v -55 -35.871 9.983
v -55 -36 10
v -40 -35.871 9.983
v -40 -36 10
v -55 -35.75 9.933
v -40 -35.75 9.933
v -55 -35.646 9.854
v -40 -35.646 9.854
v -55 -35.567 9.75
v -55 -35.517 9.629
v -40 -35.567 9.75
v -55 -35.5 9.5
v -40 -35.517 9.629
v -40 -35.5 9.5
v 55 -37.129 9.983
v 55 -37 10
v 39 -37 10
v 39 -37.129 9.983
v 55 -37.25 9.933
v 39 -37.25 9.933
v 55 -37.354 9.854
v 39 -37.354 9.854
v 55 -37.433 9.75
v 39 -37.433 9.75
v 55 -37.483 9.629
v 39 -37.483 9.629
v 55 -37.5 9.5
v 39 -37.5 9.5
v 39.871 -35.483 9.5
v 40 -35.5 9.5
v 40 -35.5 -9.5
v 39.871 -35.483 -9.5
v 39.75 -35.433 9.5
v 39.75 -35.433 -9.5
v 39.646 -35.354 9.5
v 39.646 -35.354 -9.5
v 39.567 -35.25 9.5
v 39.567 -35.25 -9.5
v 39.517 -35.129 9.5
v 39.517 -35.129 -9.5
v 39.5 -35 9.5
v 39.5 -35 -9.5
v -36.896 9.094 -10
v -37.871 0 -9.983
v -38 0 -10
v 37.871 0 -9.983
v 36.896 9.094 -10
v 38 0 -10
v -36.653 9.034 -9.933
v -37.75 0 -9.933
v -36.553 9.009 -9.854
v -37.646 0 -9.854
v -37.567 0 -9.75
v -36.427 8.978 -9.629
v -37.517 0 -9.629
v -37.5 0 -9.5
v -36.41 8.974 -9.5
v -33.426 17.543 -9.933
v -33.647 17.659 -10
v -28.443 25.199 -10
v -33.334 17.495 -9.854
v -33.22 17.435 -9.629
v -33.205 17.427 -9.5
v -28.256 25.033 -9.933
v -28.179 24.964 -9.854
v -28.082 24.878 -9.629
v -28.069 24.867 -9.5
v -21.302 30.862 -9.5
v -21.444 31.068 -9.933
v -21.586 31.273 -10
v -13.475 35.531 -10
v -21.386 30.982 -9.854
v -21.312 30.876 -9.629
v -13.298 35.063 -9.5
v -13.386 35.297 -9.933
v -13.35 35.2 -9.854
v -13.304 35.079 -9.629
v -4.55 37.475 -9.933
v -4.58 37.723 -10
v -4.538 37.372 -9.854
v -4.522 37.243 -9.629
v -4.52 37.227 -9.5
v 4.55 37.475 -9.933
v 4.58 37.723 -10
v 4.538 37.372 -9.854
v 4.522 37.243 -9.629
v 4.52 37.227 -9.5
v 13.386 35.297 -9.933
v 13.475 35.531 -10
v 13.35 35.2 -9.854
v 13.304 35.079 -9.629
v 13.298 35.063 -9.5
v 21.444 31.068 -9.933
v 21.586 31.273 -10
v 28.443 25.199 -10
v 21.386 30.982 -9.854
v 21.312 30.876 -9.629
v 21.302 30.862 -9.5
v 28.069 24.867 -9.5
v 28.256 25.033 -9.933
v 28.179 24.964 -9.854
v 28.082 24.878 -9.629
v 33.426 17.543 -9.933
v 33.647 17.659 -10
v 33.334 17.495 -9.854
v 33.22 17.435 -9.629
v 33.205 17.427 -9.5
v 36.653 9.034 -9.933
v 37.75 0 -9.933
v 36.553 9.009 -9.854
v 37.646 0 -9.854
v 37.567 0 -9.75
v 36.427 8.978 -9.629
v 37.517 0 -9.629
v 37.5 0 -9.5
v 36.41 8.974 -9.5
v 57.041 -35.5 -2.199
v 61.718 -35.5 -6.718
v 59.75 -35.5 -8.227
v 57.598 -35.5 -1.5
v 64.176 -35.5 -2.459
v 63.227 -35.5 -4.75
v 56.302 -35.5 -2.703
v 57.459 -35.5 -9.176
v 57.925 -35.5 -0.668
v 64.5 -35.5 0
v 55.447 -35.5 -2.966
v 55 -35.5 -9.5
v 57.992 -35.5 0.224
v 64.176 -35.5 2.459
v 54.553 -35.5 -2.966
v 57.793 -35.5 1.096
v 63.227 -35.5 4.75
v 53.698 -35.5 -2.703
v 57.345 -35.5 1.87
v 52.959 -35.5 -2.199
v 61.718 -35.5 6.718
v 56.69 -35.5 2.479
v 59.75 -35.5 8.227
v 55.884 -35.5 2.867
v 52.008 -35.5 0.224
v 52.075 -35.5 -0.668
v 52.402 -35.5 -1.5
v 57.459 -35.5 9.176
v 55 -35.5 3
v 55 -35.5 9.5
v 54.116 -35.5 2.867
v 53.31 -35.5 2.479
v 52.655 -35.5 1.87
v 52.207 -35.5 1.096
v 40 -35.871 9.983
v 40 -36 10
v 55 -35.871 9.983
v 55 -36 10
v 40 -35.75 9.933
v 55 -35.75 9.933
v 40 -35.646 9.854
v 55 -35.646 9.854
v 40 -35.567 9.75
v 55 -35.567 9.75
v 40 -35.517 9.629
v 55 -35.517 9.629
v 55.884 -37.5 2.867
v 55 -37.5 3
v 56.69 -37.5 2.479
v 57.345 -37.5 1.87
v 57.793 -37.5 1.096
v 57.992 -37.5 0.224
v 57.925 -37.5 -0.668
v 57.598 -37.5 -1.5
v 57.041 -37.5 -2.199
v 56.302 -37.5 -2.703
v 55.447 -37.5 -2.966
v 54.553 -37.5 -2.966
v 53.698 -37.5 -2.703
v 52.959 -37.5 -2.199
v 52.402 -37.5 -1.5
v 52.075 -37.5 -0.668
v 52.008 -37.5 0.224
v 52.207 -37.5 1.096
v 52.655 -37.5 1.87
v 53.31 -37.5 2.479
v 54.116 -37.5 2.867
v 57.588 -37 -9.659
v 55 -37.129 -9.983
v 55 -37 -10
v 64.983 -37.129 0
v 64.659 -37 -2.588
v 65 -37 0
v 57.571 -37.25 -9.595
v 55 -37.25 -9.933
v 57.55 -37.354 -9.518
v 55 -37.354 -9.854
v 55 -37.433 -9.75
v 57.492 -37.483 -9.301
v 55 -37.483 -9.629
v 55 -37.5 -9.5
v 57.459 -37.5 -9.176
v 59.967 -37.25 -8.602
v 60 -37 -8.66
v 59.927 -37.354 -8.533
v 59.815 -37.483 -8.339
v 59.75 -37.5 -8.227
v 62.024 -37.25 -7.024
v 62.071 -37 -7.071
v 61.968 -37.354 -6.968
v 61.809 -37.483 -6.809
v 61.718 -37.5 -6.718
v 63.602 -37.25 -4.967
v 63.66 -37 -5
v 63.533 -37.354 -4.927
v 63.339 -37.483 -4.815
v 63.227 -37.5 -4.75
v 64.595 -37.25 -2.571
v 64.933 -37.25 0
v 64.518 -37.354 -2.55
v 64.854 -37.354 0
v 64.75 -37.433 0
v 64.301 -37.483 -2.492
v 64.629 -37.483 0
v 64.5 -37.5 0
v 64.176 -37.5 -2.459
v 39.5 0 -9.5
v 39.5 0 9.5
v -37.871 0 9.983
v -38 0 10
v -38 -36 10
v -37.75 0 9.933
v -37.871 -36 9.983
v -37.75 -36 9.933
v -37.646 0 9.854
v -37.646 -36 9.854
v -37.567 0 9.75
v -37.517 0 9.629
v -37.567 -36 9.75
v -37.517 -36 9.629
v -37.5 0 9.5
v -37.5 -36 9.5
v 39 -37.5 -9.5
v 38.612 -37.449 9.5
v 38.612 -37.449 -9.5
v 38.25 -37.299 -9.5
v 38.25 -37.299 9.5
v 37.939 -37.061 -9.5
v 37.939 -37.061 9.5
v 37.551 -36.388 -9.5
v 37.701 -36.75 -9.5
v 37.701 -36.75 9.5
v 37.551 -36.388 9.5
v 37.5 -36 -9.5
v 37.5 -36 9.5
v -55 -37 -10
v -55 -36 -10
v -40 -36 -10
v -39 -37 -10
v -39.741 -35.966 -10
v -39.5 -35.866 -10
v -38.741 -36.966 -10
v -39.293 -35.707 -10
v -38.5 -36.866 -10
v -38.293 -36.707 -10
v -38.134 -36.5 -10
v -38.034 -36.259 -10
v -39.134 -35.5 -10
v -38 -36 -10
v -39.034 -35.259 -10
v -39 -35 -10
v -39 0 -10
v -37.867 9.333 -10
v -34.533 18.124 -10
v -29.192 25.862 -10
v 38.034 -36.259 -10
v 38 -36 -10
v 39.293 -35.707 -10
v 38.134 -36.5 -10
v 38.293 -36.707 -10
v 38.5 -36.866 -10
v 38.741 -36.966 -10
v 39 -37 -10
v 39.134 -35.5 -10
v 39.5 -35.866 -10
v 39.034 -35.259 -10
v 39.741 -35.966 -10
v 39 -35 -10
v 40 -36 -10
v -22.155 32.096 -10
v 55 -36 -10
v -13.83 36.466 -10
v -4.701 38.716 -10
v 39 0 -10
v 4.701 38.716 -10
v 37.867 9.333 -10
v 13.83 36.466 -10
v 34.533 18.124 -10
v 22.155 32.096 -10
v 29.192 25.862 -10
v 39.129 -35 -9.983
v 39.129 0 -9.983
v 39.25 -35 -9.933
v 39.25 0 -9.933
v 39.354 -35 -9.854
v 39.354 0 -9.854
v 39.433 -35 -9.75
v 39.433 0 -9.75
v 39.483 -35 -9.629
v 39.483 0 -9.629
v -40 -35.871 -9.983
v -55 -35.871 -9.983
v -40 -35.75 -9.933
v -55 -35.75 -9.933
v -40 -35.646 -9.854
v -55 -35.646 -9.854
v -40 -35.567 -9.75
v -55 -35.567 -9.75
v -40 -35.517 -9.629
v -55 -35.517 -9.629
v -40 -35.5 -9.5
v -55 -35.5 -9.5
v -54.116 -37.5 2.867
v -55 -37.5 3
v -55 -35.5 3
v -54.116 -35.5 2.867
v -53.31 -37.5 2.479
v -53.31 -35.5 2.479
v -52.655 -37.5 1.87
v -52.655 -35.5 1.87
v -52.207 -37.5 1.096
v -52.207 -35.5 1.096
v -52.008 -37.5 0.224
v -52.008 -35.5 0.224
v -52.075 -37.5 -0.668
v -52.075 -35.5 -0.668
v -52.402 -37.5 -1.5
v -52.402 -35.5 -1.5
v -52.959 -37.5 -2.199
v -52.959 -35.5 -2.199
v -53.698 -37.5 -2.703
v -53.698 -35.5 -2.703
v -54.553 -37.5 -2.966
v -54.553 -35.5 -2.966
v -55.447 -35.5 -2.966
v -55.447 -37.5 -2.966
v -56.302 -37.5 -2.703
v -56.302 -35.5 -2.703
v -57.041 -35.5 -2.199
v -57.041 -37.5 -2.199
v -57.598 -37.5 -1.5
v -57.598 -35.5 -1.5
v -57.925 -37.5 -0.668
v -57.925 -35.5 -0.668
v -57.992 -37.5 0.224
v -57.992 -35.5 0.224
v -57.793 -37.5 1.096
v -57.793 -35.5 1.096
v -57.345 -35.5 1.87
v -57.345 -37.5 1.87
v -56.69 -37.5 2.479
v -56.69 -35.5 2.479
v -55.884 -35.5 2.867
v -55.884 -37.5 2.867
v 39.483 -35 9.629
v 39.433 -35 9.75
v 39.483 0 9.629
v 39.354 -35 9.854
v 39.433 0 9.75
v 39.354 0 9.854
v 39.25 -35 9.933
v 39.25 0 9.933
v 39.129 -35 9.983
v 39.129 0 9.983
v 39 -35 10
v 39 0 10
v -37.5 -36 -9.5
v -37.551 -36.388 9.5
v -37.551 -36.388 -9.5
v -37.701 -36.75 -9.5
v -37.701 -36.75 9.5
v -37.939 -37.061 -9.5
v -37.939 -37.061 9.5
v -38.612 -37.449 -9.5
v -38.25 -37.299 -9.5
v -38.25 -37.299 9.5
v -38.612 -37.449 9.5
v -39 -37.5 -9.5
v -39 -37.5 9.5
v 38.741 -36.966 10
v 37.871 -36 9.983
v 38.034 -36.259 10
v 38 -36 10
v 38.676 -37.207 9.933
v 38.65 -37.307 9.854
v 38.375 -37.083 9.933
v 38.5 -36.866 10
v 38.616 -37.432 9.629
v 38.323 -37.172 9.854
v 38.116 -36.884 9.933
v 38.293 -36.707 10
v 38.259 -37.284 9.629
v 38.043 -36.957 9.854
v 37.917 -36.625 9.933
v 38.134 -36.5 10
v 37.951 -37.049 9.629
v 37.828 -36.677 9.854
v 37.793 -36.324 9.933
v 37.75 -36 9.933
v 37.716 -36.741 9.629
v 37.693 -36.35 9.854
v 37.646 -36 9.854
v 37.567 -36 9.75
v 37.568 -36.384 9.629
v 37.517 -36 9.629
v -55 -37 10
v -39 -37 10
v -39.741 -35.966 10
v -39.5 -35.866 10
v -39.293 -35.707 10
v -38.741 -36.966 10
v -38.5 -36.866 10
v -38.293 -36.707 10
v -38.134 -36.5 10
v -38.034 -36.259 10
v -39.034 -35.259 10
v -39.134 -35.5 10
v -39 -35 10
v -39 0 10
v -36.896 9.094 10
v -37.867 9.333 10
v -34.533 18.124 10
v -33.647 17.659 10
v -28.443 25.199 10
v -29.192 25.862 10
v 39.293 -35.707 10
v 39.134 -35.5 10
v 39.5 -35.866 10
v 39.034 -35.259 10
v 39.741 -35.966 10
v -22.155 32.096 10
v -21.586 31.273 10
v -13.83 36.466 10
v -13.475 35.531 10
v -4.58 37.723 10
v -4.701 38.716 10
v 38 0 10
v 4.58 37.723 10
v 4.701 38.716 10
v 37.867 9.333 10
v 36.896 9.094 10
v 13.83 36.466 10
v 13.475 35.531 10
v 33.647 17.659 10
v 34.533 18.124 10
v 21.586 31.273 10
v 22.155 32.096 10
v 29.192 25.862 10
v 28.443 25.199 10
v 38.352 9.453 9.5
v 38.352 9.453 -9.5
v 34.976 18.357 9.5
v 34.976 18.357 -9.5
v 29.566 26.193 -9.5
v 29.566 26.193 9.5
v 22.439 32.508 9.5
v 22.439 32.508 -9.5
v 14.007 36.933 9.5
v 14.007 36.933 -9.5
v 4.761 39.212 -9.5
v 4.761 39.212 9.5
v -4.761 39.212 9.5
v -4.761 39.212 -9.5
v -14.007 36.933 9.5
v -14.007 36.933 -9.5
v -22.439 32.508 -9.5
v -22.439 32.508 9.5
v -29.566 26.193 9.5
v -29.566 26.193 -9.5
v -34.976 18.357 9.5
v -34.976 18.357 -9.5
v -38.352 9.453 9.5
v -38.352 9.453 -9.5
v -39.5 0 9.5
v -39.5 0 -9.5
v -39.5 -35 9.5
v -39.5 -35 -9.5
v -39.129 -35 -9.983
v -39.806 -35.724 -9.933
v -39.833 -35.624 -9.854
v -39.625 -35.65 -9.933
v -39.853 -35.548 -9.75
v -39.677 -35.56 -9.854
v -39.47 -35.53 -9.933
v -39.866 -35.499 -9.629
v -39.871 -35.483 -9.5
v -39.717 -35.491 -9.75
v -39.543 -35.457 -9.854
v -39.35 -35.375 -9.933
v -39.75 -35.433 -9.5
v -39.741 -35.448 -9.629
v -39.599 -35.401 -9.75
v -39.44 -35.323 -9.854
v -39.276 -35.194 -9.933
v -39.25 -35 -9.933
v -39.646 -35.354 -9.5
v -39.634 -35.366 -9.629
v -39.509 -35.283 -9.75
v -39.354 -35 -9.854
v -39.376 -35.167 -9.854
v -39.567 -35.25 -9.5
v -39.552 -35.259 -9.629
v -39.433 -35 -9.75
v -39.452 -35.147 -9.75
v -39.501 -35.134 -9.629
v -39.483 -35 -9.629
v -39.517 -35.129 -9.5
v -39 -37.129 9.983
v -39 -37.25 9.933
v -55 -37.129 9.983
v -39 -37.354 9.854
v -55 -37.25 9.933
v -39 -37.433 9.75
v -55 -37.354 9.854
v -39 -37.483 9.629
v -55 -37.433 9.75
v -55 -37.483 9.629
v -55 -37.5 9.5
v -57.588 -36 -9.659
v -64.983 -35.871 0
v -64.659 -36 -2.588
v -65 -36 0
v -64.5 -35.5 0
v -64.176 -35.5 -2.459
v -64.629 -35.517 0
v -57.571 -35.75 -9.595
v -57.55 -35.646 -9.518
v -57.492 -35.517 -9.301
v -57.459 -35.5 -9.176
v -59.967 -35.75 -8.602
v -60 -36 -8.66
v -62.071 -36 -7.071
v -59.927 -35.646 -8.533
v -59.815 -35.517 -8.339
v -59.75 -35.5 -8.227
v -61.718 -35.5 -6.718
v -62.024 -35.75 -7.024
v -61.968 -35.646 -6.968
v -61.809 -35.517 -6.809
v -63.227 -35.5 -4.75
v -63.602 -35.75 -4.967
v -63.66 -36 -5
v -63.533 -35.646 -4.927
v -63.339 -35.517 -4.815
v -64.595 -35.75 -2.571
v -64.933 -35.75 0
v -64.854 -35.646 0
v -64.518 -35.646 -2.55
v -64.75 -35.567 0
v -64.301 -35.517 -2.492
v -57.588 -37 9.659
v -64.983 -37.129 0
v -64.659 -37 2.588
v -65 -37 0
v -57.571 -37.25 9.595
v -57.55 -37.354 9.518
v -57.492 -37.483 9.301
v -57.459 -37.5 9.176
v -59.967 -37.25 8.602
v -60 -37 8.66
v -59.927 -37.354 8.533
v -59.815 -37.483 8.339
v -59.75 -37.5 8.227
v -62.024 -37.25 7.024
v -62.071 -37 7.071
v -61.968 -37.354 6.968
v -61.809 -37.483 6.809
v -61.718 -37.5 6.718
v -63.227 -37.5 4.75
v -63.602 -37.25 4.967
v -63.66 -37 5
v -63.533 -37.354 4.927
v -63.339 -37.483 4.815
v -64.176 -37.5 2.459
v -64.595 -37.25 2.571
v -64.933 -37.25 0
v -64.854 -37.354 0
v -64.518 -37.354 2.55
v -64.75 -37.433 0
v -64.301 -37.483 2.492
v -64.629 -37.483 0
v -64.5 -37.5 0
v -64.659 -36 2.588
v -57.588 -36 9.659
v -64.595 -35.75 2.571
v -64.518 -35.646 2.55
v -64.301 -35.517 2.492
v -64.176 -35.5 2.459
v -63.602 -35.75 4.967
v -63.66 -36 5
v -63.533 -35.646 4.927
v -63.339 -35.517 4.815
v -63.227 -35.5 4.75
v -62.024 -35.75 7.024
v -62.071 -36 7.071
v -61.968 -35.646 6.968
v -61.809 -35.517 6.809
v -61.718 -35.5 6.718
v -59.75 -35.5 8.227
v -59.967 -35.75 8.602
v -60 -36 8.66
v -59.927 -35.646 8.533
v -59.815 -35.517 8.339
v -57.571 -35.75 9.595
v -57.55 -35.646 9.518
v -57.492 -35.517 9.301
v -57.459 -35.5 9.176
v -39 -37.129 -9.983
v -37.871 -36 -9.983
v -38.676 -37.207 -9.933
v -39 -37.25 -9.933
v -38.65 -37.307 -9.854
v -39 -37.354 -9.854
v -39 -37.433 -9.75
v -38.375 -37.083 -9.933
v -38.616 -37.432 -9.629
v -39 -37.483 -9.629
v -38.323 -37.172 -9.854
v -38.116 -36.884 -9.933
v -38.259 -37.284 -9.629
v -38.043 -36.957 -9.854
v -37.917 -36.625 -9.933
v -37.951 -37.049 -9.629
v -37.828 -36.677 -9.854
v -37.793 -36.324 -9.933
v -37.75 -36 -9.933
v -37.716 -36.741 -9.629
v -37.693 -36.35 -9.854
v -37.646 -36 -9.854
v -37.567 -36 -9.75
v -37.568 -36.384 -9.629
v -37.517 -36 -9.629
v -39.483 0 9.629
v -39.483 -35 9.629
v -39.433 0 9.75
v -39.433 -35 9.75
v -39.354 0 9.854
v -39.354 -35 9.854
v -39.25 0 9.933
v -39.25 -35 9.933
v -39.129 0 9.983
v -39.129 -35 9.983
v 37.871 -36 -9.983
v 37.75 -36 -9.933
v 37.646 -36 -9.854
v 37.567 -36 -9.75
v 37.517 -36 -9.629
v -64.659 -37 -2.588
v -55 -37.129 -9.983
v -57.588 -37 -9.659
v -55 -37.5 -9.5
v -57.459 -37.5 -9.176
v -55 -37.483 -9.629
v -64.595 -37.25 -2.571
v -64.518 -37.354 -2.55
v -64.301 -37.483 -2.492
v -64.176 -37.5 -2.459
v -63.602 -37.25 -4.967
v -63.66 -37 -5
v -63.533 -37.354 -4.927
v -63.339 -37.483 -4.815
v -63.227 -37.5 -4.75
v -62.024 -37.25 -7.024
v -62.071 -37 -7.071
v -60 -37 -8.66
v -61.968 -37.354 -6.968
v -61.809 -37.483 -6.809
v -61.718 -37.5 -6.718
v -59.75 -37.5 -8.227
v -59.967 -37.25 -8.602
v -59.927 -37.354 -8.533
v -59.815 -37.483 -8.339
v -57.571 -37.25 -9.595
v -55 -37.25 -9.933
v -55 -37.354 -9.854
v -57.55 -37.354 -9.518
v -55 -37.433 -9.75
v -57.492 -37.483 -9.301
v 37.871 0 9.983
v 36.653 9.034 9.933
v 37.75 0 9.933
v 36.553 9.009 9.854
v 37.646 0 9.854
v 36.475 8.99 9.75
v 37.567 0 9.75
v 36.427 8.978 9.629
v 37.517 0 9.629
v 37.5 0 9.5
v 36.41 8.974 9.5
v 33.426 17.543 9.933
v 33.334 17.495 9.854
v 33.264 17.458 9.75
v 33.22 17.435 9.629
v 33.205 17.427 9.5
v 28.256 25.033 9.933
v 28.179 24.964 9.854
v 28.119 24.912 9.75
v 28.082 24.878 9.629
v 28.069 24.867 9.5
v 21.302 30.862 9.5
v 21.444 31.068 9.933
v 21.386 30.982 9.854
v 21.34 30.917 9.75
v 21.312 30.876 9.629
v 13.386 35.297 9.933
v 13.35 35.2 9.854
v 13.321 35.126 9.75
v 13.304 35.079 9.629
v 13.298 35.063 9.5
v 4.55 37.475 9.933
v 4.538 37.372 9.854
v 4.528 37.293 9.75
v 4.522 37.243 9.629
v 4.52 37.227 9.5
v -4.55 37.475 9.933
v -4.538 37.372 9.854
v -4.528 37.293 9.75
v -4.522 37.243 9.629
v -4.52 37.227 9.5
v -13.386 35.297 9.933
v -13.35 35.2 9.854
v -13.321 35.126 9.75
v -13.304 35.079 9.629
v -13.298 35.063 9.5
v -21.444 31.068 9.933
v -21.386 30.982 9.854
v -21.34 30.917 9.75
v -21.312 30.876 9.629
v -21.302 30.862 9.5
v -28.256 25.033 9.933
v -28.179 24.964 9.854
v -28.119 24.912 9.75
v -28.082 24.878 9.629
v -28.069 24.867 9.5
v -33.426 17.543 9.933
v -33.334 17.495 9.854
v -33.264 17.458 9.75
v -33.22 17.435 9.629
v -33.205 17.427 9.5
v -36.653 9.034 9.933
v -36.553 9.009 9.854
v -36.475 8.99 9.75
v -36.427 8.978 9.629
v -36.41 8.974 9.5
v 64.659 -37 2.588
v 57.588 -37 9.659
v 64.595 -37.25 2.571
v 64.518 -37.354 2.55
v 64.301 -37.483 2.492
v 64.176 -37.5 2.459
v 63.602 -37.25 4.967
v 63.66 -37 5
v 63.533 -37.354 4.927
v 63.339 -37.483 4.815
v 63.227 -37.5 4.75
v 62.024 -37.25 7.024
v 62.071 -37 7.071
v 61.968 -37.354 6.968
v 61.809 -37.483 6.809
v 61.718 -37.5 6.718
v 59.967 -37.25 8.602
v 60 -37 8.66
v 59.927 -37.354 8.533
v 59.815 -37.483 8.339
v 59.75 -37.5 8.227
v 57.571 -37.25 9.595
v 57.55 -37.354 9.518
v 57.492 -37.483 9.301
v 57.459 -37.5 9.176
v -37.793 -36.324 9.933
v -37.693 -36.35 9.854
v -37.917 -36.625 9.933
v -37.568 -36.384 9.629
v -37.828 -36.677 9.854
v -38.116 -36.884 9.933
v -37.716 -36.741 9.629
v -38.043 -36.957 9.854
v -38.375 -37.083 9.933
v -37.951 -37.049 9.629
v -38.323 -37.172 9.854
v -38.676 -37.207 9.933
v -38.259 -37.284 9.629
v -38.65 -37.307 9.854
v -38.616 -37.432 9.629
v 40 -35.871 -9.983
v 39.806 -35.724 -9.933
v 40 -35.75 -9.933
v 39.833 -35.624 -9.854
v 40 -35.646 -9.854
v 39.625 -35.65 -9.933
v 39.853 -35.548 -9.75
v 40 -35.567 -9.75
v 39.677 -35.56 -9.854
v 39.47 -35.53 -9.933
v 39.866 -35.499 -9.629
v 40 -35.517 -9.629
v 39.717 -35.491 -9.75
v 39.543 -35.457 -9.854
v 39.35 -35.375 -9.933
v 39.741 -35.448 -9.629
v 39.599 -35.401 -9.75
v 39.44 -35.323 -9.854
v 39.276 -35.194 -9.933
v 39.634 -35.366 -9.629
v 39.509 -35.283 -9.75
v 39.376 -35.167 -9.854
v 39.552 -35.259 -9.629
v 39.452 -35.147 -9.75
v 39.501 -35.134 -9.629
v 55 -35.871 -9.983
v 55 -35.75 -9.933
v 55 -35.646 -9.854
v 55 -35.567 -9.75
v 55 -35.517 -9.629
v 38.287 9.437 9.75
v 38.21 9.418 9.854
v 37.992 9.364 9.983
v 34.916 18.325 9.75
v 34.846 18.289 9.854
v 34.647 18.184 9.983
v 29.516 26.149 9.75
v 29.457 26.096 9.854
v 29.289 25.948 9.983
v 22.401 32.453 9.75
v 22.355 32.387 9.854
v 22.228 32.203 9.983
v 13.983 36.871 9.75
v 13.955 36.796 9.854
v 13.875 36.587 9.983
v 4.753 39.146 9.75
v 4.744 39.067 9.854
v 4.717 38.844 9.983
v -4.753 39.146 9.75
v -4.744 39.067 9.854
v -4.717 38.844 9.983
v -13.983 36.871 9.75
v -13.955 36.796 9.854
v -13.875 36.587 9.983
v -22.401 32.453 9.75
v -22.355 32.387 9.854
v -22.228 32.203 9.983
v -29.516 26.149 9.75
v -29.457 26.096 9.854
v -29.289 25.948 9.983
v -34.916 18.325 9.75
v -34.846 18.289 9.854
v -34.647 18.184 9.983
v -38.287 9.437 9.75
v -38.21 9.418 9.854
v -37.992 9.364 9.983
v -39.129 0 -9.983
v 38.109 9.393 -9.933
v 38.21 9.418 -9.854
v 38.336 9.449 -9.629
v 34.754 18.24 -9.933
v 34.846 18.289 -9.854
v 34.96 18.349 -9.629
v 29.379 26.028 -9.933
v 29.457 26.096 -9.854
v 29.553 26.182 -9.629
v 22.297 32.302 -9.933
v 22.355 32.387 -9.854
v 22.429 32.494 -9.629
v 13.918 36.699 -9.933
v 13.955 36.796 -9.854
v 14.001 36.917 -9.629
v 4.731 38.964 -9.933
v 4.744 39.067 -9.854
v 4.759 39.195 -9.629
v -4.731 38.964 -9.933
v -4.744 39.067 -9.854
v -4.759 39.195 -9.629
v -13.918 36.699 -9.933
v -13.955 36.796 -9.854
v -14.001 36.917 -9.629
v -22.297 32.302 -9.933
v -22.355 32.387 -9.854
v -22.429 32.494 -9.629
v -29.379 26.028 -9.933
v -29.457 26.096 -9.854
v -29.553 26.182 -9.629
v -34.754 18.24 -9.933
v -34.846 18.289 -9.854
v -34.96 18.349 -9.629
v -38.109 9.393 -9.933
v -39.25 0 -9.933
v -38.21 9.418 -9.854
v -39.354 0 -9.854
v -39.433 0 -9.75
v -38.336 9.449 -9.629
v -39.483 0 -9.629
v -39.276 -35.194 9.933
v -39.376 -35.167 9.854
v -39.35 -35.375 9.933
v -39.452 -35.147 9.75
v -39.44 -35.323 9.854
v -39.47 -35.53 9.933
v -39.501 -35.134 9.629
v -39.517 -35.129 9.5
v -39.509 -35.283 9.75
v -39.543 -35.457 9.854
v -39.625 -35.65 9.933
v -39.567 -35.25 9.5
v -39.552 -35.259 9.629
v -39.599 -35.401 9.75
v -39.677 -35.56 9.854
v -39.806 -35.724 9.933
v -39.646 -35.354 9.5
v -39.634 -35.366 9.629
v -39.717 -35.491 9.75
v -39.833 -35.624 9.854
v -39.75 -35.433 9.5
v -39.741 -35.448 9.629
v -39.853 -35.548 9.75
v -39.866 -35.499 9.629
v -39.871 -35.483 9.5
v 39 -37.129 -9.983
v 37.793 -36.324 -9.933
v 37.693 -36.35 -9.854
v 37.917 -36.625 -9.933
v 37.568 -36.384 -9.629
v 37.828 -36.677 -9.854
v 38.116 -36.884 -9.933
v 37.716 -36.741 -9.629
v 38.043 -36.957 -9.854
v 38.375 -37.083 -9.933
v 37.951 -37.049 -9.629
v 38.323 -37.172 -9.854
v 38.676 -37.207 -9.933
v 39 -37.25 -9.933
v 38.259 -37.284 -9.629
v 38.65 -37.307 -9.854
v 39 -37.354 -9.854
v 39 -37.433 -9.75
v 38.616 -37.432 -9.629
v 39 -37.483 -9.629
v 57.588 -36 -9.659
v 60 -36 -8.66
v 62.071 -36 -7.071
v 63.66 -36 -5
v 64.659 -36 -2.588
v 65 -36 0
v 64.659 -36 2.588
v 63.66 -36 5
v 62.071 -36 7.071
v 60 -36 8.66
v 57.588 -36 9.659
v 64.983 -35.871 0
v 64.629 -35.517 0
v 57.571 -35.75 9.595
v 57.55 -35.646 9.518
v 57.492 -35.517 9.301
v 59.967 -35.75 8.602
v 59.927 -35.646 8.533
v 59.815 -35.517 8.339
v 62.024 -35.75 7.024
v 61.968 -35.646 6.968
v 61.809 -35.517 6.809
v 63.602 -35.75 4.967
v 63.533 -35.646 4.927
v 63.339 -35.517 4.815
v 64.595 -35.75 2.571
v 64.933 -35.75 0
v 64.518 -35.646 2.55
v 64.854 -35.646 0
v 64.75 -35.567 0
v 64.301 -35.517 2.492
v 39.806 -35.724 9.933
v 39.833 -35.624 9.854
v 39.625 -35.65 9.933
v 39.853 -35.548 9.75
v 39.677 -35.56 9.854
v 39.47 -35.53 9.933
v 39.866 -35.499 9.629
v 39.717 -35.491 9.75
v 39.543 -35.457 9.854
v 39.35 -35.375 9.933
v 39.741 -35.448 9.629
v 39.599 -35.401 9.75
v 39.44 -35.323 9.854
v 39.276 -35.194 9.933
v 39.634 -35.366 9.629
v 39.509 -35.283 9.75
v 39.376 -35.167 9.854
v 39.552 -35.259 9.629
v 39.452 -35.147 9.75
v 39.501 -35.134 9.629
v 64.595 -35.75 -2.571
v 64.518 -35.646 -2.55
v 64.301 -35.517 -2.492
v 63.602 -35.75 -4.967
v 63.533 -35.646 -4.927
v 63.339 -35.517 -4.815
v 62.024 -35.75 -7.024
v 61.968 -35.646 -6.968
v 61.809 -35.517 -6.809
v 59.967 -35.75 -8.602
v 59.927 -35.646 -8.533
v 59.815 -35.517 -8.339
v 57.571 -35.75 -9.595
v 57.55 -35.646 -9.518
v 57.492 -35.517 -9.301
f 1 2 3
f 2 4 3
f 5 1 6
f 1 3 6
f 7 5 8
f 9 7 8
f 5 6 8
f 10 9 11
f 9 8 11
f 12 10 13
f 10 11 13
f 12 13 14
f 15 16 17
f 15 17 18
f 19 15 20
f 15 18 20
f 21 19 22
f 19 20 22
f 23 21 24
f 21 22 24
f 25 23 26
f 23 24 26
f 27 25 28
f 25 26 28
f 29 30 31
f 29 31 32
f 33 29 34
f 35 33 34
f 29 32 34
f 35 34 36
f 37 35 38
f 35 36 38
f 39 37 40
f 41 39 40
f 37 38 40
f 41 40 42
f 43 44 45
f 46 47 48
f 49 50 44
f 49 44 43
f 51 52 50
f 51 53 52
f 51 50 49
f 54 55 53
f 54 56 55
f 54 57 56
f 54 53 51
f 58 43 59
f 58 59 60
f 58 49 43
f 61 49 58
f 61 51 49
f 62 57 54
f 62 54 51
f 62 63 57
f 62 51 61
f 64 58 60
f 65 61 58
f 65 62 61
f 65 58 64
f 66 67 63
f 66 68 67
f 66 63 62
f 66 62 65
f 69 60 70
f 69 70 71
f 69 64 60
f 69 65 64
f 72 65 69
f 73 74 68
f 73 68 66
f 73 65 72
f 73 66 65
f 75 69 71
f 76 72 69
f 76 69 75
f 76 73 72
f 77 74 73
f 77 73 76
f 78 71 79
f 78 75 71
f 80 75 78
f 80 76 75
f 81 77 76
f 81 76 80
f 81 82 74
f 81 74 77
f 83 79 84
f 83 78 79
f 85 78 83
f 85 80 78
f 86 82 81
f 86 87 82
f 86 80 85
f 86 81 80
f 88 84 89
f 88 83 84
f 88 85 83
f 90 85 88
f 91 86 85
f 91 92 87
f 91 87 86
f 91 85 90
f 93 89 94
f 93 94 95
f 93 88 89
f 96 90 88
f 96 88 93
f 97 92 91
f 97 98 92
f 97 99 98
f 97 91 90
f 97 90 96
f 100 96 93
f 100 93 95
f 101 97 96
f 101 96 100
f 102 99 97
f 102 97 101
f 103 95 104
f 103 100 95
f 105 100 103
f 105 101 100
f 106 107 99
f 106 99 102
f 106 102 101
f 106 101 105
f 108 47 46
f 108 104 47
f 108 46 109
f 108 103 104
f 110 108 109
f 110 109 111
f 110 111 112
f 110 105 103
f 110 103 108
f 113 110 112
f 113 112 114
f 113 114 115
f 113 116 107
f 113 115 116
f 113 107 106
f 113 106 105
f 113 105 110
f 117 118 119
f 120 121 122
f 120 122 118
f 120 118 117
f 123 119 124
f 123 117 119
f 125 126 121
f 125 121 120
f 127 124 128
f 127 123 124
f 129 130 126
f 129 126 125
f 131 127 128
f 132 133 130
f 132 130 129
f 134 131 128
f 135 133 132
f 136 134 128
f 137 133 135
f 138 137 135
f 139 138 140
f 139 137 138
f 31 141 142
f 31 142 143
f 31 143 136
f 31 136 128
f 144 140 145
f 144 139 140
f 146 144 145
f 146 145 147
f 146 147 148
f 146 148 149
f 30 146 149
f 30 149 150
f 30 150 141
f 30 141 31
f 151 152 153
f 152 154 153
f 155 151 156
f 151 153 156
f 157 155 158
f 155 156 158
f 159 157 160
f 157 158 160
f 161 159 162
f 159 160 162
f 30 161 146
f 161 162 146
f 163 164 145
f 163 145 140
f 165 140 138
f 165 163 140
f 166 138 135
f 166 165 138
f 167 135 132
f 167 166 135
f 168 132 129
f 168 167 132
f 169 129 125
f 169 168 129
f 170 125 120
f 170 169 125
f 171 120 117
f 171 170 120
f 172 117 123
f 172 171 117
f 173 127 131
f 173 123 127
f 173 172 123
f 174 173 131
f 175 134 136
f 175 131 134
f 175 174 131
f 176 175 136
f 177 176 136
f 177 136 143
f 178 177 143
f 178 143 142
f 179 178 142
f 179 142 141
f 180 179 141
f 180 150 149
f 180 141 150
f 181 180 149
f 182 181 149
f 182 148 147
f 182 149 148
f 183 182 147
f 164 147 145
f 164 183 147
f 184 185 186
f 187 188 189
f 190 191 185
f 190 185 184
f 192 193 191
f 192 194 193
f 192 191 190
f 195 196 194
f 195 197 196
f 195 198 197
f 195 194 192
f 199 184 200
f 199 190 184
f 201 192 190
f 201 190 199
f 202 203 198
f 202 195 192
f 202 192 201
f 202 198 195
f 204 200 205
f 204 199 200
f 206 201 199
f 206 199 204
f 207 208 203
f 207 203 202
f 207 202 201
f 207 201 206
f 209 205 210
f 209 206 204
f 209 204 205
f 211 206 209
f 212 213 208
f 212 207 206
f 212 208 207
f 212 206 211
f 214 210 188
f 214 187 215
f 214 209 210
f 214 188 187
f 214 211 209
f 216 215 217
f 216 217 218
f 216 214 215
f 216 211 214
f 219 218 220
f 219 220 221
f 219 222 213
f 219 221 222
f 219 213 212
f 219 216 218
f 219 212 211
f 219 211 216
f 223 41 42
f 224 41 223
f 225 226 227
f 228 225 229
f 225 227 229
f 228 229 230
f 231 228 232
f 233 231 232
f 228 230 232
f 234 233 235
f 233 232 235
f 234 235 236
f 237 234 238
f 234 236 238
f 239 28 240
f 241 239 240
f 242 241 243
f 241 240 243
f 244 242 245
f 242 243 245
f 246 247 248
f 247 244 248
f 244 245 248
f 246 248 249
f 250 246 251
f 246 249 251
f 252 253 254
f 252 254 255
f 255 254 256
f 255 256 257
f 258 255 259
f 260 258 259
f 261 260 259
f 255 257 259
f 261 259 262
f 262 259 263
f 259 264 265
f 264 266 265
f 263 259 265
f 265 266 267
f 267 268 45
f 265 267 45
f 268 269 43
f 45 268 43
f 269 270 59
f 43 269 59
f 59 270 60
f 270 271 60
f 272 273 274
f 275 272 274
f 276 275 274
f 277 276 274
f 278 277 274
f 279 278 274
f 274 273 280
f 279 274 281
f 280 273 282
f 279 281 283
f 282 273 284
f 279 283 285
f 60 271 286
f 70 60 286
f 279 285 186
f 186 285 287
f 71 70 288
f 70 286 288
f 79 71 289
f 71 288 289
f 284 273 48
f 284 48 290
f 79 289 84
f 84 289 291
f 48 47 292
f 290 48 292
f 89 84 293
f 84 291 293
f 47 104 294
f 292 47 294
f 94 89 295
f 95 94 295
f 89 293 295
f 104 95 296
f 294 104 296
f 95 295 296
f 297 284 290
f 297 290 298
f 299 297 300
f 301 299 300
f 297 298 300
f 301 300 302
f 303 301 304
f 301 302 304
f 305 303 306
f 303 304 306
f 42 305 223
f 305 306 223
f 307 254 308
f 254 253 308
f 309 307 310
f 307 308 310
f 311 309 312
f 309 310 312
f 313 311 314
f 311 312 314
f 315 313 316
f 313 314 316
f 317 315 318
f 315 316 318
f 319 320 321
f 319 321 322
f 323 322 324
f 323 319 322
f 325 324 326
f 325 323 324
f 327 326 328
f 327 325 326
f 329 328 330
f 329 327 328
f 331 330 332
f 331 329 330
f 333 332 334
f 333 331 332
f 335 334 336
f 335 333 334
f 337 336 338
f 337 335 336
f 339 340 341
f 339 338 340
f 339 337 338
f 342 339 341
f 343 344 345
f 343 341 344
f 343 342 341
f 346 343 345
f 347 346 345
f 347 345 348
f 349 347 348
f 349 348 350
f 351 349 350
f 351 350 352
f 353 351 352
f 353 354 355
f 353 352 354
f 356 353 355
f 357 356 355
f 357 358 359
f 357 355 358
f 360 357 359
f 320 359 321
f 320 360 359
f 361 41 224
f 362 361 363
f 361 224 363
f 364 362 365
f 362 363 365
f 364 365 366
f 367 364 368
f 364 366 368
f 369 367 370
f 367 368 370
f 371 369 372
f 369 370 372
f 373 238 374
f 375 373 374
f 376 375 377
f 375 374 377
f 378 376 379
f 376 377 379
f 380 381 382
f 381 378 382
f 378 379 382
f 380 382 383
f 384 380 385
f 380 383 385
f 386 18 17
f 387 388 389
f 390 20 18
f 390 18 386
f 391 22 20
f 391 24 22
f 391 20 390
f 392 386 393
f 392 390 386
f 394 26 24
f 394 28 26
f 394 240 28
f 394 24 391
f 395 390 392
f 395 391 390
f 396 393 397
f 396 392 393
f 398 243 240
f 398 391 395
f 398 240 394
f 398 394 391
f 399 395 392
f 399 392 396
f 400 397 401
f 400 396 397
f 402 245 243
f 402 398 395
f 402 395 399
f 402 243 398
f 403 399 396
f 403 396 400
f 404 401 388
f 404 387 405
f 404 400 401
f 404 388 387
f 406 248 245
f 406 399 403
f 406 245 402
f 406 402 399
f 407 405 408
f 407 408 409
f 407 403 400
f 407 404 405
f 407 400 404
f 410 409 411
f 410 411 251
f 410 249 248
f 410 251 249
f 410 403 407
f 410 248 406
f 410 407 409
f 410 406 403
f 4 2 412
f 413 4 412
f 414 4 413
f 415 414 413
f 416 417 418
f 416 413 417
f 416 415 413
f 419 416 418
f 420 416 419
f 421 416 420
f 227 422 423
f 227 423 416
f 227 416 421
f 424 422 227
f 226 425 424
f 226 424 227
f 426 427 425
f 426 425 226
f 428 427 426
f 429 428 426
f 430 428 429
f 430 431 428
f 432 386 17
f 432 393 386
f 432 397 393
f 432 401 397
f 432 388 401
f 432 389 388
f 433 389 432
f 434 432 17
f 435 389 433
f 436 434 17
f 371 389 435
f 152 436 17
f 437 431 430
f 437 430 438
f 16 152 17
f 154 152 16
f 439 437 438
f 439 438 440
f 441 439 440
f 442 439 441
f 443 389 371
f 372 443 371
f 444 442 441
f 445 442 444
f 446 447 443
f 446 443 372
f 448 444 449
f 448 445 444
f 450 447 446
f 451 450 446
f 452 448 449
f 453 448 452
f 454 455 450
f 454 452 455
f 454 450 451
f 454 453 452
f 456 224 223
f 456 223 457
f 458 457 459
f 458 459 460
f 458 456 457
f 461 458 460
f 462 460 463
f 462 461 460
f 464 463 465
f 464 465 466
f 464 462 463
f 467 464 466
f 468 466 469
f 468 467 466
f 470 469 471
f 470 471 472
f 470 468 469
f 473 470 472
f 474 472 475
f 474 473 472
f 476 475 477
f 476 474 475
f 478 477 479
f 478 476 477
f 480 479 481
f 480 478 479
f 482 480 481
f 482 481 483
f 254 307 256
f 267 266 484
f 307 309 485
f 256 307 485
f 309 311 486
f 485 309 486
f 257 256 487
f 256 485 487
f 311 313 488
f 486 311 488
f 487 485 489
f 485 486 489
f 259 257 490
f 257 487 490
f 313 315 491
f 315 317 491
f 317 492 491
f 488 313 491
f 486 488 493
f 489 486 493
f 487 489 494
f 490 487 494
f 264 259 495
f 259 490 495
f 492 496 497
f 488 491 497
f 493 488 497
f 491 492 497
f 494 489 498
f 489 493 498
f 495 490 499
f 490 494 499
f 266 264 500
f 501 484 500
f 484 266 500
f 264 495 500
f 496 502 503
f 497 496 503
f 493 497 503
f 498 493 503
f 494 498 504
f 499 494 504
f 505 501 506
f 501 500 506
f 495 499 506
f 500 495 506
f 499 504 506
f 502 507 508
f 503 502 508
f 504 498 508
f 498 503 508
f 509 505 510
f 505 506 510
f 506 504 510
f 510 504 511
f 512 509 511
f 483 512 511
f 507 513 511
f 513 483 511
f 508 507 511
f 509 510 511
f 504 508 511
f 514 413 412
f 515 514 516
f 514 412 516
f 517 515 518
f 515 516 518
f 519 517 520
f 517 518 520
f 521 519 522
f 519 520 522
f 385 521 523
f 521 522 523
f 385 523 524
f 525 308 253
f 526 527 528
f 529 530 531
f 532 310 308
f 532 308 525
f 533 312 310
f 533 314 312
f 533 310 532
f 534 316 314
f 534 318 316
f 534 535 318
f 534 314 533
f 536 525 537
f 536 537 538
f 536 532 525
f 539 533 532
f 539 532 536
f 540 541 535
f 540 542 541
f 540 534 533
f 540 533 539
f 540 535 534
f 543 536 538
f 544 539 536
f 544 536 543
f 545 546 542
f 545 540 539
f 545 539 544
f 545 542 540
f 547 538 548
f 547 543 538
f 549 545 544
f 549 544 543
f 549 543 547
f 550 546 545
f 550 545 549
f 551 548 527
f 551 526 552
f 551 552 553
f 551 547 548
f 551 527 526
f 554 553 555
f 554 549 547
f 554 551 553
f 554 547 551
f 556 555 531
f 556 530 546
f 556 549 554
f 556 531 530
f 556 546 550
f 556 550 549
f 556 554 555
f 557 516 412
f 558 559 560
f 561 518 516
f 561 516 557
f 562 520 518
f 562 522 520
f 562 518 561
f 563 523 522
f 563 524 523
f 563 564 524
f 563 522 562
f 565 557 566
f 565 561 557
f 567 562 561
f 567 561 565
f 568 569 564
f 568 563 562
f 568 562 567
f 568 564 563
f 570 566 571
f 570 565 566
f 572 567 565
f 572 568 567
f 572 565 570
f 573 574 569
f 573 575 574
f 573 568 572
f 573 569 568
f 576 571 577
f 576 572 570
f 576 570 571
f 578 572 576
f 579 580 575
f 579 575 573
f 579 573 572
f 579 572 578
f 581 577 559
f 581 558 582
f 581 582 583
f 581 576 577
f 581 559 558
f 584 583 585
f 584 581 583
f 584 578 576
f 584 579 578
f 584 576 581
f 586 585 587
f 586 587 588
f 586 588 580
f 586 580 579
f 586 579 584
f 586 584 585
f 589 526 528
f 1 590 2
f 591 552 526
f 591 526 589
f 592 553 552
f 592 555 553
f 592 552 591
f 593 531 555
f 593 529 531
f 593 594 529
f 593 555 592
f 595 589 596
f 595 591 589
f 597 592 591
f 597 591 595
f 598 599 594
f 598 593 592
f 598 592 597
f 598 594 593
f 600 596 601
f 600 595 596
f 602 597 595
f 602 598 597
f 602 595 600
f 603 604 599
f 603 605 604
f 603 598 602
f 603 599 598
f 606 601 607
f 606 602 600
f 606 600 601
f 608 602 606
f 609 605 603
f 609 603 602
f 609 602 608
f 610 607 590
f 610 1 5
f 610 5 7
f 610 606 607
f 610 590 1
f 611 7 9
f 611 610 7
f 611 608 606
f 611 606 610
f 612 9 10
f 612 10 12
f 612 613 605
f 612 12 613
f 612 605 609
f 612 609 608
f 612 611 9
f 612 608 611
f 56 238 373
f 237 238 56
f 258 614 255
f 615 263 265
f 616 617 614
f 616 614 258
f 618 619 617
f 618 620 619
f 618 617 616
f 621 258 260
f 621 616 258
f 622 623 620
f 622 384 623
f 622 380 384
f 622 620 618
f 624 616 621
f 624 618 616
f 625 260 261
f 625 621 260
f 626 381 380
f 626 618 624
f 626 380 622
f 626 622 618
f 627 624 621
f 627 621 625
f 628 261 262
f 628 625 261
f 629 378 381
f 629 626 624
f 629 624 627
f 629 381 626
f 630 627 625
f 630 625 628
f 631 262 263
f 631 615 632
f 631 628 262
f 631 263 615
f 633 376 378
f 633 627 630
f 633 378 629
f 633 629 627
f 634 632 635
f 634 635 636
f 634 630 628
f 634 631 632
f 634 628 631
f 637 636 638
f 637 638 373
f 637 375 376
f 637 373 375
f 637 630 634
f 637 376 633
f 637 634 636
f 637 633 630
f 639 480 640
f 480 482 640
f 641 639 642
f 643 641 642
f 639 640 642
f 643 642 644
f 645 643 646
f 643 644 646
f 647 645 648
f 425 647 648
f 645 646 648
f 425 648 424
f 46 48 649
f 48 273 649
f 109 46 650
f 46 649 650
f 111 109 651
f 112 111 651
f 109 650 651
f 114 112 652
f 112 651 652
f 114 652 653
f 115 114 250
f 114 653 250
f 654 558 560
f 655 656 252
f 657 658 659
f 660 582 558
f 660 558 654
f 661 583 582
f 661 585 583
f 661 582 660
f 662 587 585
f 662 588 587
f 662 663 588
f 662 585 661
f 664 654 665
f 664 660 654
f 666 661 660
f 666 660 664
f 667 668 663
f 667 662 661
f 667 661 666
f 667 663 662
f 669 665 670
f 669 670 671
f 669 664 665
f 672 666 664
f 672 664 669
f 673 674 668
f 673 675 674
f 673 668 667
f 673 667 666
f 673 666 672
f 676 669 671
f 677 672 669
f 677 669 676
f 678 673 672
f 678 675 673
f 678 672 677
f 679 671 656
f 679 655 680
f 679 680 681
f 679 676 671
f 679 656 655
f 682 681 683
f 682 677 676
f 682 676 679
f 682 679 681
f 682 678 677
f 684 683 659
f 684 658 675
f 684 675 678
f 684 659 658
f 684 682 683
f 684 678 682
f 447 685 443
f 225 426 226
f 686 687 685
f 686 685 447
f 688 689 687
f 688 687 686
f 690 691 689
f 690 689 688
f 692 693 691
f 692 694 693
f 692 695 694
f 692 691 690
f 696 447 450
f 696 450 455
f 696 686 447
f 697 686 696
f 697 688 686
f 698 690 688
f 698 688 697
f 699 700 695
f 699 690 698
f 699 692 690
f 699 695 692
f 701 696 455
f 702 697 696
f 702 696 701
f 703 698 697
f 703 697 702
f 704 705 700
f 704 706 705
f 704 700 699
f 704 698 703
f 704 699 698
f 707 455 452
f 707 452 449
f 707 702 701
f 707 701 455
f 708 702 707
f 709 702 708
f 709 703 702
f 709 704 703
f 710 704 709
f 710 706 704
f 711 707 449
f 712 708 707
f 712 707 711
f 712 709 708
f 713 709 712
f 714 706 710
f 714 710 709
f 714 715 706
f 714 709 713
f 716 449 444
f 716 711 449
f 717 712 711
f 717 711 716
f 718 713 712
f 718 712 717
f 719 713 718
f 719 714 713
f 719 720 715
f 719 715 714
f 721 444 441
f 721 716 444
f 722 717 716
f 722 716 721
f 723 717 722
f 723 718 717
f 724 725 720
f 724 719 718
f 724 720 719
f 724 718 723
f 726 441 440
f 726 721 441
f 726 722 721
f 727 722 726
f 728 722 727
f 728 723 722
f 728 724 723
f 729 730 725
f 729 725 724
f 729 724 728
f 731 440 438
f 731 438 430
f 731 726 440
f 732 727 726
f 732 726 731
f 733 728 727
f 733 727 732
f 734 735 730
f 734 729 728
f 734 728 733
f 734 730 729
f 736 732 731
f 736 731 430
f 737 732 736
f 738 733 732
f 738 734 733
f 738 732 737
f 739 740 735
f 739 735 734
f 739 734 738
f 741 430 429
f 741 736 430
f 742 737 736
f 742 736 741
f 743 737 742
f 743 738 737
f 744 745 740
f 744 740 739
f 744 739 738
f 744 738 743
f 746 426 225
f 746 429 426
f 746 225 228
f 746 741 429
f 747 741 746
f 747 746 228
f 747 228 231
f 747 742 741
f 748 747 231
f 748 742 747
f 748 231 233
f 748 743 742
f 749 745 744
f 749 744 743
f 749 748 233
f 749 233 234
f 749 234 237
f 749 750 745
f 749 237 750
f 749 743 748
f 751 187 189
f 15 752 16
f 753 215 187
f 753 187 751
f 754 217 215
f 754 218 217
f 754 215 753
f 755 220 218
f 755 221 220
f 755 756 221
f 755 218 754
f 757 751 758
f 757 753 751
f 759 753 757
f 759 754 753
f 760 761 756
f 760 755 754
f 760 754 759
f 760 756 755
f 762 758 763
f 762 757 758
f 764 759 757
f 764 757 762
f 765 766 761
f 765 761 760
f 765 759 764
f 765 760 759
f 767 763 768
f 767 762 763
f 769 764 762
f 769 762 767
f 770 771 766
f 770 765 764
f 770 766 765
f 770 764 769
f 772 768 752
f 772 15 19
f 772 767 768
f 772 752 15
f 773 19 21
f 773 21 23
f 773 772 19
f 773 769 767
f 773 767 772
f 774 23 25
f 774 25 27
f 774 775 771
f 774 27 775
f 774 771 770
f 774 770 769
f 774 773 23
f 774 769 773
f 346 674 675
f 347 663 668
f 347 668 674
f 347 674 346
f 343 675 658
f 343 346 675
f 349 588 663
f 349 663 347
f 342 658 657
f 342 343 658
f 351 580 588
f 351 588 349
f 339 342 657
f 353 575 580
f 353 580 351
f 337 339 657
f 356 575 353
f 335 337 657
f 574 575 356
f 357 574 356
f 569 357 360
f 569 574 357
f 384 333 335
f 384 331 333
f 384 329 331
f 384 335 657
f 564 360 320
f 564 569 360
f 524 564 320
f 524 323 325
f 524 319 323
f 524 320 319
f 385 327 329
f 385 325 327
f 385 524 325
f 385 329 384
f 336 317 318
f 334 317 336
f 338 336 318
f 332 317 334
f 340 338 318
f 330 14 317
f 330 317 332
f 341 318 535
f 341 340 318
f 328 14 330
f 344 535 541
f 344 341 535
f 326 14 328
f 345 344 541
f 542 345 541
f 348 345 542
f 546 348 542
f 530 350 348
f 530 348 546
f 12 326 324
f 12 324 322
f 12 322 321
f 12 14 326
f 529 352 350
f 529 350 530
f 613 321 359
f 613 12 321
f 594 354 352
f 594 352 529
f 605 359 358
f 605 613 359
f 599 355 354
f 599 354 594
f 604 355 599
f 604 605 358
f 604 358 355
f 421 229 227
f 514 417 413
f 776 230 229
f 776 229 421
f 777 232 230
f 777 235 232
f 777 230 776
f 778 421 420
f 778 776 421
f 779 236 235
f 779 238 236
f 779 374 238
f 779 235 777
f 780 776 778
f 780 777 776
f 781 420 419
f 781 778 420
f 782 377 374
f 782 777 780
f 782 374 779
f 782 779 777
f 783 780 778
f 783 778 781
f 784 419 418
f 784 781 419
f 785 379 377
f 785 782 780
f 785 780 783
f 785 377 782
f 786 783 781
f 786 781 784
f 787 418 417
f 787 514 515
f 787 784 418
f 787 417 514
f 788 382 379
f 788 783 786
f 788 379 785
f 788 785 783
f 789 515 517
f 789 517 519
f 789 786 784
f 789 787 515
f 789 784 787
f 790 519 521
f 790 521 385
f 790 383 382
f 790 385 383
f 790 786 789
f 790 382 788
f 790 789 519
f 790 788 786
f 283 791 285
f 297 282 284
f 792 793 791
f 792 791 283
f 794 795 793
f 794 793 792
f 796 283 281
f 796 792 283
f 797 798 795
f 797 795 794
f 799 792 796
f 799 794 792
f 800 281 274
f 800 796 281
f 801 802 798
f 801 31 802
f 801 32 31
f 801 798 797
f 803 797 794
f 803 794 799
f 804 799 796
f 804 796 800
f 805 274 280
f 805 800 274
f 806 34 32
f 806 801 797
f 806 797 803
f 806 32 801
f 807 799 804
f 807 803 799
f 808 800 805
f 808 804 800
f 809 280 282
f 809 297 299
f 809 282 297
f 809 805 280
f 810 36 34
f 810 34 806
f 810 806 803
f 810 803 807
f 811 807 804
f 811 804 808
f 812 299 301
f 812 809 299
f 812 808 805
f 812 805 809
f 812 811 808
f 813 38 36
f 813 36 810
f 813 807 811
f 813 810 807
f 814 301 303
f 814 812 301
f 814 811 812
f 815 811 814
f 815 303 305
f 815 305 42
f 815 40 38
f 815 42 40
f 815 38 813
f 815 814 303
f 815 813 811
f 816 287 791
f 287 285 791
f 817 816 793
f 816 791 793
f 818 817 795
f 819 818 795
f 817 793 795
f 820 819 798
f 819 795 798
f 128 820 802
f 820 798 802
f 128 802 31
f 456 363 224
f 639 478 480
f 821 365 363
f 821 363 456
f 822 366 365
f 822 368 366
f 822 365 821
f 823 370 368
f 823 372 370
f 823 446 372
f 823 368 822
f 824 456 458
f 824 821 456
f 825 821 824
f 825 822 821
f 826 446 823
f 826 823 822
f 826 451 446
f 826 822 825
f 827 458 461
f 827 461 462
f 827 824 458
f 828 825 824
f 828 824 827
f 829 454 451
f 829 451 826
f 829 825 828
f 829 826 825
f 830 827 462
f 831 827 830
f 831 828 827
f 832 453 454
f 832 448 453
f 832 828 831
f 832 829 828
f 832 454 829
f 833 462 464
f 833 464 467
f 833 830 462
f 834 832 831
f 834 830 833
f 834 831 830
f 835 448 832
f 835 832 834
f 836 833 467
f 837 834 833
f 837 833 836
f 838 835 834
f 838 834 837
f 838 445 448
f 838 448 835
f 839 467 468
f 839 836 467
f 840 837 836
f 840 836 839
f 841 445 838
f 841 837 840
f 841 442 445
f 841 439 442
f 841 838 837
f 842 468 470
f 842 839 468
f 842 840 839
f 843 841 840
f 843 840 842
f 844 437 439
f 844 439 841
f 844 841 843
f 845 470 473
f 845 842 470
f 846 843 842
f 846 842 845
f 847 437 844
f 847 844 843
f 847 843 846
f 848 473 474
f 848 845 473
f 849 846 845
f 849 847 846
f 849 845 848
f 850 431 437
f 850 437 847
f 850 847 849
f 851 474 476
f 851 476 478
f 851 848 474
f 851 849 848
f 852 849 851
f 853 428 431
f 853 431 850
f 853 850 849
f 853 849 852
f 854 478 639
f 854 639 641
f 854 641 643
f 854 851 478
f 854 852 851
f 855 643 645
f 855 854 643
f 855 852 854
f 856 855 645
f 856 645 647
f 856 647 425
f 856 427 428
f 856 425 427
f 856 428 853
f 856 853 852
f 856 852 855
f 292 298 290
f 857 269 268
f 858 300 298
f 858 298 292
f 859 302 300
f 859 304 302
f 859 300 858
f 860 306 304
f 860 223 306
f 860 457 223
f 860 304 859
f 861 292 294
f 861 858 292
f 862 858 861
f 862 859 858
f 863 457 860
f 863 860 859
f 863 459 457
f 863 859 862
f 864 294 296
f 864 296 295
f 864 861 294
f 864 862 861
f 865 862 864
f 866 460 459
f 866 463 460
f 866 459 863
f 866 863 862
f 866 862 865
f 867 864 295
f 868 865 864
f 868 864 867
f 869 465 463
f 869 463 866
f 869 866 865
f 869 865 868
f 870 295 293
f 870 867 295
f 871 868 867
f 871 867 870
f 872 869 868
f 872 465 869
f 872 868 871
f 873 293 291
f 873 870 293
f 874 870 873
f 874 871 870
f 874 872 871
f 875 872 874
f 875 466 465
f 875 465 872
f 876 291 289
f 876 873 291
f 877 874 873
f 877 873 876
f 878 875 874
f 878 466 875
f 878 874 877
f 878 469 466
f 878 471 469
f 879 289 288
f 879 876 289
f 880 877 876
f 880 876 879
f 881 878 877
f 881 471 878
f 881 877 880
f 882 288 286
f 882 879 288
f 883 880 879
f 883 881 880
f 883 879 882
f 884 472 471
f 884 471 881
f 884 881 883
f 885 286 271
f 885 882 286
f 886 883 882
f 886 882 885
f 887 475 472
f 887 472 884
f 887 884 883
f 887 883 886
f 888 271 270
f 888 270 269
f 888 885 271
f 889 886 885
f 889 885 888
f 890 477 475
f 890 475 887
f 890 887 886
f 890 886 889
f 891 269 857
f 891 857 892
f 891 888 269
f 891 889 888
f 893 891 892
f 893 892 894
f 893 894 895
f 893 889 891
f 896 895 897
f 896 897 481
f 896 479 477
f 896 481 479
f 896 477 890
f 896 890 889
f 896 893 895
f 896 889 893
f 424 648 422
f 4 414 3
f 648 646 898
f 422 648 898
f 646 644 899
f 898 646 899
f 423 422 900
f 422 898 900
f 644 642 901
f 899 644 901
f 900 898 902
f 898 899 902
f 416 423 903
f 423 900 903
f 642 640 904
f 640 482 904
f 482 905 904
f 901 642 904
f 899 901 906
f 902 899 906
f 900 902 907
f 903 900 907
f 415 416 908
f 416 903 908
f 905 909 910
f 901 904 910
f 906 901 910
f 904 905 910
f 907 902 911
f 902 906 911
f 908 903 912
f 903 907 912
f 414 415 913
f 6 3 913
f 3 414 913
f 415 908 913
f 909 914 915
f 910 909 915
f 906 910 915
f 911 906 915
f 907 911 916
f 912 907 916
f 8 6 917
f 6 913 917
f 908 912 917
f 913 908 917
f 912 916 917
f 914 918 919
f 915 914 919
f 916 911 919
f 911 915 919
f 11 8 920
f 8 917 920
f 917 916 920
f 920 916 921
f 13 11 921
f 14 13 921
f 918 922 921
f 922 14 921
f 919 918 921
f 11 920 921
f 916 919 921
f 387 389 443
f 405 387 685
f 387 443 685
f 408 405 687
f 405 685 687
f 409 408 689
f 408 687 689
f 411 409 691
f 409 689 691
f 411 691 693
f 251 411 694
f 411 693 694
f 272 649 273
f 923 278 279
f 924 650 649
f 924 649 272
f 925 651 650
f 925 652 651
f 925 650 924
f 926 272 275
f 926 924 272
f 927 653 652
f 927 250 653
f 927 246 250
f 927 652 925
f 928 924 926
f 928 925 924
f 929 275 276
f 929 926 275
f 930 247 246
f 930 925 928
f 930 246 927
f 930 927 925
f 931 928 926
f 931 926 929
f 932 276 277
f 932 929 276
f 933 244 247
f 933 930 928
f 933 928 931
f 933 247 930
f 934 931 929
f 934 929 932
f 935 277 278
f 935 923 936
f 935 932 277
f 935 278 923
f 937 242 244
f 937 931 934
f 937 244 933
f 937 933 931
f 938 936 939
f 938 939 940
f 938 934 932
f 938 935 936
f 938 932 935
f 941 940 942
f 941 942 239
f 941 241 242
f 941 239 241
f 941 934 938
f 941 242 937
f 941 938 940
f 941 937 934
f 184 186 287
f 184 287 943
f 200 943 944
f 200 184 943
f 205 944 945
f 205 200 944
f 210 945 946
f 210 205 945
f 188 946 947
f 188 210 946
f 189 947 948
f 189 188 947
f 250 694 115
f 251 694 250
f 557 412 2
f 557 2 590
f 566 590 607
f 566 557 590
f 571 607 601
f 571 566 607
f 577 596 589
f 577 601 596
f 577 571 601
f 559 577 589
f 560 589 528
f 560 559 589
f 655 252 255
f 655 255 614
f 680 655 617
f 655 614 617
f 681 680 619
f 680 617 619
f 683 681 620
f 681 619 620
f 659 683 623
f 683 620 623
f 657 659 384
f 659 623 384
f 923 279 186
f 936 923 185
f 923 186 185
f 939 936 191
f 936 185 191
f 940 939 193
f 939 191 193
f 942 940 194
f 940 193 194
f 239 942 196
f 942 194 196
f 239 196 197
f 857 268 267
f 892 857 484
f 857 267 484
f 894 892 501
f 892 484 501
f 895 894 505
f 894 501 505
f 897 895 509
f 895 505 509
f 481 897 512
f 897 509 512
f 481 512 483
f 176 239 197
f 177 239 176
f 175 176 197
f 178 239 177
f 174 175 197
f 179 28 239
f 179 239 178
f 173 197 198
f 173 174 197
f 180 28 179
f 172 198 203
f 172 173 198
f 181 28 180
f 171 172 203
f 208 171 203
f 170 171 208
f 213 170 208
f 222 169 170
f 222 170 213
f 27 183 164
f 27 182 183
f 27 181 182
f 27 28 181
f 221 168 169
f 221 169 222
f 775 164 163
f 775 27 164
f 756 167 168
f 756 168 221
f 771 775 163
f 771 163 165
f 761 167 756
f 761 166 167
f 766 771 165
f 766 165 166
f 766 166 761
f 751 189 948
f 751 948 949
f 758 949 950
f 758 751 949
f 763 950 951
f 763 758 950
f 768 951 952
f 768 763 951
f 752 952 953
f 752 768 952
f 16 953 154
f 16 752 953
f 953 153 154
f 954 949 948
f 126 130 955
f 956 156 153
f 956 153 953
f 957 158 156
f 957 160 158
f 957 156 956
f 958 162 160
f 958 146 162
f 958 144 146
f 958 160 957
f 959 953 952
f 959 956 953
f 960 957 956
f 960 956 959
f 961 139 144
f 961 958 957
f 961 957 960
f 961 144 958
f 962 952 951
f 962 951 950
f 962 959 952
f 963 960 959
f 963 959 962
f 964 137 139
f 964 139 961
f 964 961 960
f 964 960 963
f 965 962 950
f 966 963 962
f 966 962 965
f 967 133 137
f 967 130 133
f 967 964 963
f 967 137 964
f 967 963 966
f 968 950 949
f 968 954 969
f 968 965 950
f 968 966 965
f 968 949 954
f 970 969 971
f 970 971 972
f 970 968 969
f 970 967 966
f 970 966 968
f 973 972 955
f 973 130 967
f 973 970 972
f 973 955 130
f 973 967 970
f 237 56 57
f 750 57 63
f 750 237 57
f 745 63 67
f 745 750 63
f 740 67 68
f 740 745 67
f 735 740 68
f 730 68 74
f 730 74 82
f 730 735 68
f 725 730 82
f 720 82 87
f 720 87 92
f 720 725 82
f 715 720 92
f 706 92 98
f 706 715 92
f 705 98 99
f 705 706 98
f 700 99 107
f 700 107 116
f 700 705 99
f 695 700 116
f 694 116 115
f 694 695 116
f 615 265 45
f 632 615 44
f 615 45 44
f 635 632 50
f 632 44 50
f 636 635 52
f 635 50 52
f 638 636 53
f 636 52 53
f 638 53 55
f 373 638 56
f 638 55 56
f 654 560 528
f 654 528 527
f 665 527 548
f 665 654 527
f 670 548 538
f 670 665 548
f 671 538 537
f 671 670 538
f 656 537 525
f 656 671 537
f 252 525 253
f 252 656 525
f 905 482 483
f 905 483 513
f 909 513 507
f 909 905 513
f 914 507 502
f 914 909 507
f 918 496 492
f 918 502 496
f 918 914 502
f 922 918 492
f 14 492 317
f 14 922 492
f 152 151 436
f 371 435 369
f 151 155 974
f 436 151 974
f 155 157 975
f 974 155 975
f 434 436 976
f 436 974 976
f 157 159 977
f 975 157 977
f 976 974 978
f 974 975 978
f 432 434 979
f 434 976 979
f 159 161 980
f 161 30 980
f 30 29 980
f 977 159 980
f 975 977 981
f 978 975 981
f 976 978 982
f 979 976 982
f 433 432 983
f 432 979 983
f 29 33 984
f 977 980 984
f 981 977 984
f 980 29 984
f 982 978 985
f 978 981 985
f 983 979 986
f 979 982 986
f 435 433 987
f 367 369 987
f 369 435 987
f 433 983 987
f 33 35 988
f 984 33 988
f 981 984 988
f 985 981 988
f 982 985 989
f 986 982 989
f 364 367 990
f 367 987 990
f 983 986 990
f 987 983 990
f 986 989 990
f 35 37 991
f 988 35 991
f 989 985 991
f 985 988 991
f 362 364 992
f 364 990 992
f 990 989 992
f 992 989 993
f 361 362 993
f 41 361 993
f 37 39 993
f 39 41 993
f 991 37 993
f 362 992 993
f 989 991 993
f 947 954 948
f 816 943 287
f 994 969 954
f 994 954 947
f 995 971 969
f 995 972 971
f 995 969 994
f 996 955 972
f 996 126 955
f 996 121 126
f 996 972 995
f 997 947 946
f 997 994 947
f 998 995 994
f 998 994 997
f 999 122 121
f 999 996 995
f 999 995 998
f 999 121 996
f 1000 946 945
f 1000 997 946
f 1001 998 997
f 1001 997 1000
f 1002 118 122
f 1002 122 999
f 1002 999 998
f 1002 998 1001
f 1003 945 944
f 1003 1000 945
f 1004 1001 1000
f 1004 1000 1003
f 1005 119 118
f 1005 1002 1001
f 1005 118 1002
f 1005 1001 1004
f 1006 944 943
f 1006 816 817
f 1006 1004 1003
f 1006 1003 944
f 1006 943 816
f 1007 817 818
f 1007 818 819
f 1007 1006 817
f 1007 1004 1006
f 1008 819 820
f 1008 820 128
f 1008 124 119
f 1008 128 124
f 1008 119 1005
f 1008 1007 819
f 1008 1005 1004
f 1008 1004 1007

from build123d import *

# Parameters (mm, degrees)
BOSS_EXTRUDE1_DEPTH     = 10
CUT_EXTRUDE1_DEPTH      = 100.749686716
CUT_EXTRUDE1_DEPTH_BACK = 100.749686716
SKETCH3_R               = 3
FILLET2_R               = 1.5
FILLET3_R               = 0.5


with BuildPart() as part:
    # Sketch1 → Boss-Extrude1 (new, symmetric)
    with BuildSketch(Plane.XY):
        with BuildLine():
            Line((-39.5, 0), (-39.5, -35.5))
            Line((-39.5, -35.5), (-65, -35.5))
            Line((-65, -35.5), (-65, -37.5))
            Line((-65, -37.5), (-37.5, -37.5))
            Line((-37.5, -37.5), (-37.5, 0))
            ThreePointArc((-37.5, 0), (0, 37.5), (37.5, 0))
            Line((37.5, 0), (37.5, -37.5))
            Line((37.5, -37.5), (65, -37.5))
            Line((65, -37.5), (65, -35.5))
            Line((65, -35.5), (39.5, -35.5))
            Line((39.5, -35.5), (39.5, 0))
            ThreePointArc((39.5, 0), (0, 39.5), (-39.5, 0))
        make_face()
    extrude(amount=BOSS_EXTRUDE1_DEPTH, both=True)

    # Sketch3 → Cut-Extrude1 (cut, two sides: drawn at the far end of the back side and taken through both)
    with BuildSketch(Plane(origin=(0, -35.5, 0), x_dir=(1, 0, 0), z_dir=(0, 1, 0)).offset(-CUT_EXTRUDE1_DEPTH_BACK)):
        with BuildLine():
            Line((65, -10), (65, -1.23e-07))
            ThreePointArc((65, -1.23e-07), (62.071067768, -7.071067855), (55, -10))
            Line((55, -10), (65, -10))
        make_face()
        with BuildLine():
            Line((65, 10), (55, 10))
            ThreePointArc((55, 10), (62.071067855, 7.071067768), (65, -1.23e-07))
            Line((65, -1.23e-07), (65, 10))
        make_face()
        with BuildLine():
            Line((-65, 10), (-65, -7e-08))
            ThreePointArc((-65, -7e-08), (-62.071067837, 7.071067787), (-55, 10))
            Line((-55, 10), (-65, 10))
        make_face()
        with BuildLine():
            Line((-65, -10), (-55, -10))
            ThreePointArc((-55, -10), (-62.071067787, -7.071067837), (-65, -7e-08))
            Line((-65, -7e-08), (-65, -10))
        make_face()
        with Locations(Location((-55, 0, 0), (0, 0, 270))):
            Circle(SKETCH3_R)
        with Locations(Location((55, 0, 0), (0, 0, 270))):
            Circle(SKETCH3_R)
    extrude(amount=CUT_EXTRUDE1_DEPTH + CUT_EXTRUDE1_DEPTH_BACK, mode=Mode.SUBTRACT)

    # Fillet2
    fillet2_edges = [part.edges().sort_by_distance(p)[0] for p in [
        (37.5, -37.5, 0),
        (-37.5, -37.5, 0),
    ]]
    fillet(fillet2_edges, radius=FILLET2_R)

    # Fillet3
    fillet3_edges = [part.edges().sort_by_distance(p)[0] for p in [
        (0, 39.5, 10),
        (37.5, -18, -10),
        (0, 37.5, -10),
        (-47.25, -35.5, -10),
        (-39.5, -17.75, -10),
        (0, 39.5, -10),
        (39.5, -17.75, -10),
        (-39.5, -17.75, 10),
        (-47.25, -35.5, 10),
        (-39.5, -35.5, 0),
        (39.5, -35.5, 0),
        (47.25, -35.5, -10),
        (0, 37.5, 10),
        (-47, -37.5, 10),
        (37.5, -18, 10),
        (65, -37.5, 0),
        (65, -35.5, 0),
        (-65, -35.5, 0),
        (-65, -37.5, 0),
        (-47, -37.5, -10),
        (47.25, -35.5, 10),
        (47, -37.5, 10),
        (47, -37.5, -10),
        (39.5, -17.75, 10),
        (-37.5, -18, -10),
        (-37.939339828, -37.060660172, -10),
        (37.939339828, -37.060660172, -10),
        (-37.5, -18, 10),
        (-37.939339828, -37.060660172, 10),
        (37.939339828, -37.060660172, 10),
    ]]
    fillet(fillet3_edges, radius=FILLET3_R)


solid = part.part
